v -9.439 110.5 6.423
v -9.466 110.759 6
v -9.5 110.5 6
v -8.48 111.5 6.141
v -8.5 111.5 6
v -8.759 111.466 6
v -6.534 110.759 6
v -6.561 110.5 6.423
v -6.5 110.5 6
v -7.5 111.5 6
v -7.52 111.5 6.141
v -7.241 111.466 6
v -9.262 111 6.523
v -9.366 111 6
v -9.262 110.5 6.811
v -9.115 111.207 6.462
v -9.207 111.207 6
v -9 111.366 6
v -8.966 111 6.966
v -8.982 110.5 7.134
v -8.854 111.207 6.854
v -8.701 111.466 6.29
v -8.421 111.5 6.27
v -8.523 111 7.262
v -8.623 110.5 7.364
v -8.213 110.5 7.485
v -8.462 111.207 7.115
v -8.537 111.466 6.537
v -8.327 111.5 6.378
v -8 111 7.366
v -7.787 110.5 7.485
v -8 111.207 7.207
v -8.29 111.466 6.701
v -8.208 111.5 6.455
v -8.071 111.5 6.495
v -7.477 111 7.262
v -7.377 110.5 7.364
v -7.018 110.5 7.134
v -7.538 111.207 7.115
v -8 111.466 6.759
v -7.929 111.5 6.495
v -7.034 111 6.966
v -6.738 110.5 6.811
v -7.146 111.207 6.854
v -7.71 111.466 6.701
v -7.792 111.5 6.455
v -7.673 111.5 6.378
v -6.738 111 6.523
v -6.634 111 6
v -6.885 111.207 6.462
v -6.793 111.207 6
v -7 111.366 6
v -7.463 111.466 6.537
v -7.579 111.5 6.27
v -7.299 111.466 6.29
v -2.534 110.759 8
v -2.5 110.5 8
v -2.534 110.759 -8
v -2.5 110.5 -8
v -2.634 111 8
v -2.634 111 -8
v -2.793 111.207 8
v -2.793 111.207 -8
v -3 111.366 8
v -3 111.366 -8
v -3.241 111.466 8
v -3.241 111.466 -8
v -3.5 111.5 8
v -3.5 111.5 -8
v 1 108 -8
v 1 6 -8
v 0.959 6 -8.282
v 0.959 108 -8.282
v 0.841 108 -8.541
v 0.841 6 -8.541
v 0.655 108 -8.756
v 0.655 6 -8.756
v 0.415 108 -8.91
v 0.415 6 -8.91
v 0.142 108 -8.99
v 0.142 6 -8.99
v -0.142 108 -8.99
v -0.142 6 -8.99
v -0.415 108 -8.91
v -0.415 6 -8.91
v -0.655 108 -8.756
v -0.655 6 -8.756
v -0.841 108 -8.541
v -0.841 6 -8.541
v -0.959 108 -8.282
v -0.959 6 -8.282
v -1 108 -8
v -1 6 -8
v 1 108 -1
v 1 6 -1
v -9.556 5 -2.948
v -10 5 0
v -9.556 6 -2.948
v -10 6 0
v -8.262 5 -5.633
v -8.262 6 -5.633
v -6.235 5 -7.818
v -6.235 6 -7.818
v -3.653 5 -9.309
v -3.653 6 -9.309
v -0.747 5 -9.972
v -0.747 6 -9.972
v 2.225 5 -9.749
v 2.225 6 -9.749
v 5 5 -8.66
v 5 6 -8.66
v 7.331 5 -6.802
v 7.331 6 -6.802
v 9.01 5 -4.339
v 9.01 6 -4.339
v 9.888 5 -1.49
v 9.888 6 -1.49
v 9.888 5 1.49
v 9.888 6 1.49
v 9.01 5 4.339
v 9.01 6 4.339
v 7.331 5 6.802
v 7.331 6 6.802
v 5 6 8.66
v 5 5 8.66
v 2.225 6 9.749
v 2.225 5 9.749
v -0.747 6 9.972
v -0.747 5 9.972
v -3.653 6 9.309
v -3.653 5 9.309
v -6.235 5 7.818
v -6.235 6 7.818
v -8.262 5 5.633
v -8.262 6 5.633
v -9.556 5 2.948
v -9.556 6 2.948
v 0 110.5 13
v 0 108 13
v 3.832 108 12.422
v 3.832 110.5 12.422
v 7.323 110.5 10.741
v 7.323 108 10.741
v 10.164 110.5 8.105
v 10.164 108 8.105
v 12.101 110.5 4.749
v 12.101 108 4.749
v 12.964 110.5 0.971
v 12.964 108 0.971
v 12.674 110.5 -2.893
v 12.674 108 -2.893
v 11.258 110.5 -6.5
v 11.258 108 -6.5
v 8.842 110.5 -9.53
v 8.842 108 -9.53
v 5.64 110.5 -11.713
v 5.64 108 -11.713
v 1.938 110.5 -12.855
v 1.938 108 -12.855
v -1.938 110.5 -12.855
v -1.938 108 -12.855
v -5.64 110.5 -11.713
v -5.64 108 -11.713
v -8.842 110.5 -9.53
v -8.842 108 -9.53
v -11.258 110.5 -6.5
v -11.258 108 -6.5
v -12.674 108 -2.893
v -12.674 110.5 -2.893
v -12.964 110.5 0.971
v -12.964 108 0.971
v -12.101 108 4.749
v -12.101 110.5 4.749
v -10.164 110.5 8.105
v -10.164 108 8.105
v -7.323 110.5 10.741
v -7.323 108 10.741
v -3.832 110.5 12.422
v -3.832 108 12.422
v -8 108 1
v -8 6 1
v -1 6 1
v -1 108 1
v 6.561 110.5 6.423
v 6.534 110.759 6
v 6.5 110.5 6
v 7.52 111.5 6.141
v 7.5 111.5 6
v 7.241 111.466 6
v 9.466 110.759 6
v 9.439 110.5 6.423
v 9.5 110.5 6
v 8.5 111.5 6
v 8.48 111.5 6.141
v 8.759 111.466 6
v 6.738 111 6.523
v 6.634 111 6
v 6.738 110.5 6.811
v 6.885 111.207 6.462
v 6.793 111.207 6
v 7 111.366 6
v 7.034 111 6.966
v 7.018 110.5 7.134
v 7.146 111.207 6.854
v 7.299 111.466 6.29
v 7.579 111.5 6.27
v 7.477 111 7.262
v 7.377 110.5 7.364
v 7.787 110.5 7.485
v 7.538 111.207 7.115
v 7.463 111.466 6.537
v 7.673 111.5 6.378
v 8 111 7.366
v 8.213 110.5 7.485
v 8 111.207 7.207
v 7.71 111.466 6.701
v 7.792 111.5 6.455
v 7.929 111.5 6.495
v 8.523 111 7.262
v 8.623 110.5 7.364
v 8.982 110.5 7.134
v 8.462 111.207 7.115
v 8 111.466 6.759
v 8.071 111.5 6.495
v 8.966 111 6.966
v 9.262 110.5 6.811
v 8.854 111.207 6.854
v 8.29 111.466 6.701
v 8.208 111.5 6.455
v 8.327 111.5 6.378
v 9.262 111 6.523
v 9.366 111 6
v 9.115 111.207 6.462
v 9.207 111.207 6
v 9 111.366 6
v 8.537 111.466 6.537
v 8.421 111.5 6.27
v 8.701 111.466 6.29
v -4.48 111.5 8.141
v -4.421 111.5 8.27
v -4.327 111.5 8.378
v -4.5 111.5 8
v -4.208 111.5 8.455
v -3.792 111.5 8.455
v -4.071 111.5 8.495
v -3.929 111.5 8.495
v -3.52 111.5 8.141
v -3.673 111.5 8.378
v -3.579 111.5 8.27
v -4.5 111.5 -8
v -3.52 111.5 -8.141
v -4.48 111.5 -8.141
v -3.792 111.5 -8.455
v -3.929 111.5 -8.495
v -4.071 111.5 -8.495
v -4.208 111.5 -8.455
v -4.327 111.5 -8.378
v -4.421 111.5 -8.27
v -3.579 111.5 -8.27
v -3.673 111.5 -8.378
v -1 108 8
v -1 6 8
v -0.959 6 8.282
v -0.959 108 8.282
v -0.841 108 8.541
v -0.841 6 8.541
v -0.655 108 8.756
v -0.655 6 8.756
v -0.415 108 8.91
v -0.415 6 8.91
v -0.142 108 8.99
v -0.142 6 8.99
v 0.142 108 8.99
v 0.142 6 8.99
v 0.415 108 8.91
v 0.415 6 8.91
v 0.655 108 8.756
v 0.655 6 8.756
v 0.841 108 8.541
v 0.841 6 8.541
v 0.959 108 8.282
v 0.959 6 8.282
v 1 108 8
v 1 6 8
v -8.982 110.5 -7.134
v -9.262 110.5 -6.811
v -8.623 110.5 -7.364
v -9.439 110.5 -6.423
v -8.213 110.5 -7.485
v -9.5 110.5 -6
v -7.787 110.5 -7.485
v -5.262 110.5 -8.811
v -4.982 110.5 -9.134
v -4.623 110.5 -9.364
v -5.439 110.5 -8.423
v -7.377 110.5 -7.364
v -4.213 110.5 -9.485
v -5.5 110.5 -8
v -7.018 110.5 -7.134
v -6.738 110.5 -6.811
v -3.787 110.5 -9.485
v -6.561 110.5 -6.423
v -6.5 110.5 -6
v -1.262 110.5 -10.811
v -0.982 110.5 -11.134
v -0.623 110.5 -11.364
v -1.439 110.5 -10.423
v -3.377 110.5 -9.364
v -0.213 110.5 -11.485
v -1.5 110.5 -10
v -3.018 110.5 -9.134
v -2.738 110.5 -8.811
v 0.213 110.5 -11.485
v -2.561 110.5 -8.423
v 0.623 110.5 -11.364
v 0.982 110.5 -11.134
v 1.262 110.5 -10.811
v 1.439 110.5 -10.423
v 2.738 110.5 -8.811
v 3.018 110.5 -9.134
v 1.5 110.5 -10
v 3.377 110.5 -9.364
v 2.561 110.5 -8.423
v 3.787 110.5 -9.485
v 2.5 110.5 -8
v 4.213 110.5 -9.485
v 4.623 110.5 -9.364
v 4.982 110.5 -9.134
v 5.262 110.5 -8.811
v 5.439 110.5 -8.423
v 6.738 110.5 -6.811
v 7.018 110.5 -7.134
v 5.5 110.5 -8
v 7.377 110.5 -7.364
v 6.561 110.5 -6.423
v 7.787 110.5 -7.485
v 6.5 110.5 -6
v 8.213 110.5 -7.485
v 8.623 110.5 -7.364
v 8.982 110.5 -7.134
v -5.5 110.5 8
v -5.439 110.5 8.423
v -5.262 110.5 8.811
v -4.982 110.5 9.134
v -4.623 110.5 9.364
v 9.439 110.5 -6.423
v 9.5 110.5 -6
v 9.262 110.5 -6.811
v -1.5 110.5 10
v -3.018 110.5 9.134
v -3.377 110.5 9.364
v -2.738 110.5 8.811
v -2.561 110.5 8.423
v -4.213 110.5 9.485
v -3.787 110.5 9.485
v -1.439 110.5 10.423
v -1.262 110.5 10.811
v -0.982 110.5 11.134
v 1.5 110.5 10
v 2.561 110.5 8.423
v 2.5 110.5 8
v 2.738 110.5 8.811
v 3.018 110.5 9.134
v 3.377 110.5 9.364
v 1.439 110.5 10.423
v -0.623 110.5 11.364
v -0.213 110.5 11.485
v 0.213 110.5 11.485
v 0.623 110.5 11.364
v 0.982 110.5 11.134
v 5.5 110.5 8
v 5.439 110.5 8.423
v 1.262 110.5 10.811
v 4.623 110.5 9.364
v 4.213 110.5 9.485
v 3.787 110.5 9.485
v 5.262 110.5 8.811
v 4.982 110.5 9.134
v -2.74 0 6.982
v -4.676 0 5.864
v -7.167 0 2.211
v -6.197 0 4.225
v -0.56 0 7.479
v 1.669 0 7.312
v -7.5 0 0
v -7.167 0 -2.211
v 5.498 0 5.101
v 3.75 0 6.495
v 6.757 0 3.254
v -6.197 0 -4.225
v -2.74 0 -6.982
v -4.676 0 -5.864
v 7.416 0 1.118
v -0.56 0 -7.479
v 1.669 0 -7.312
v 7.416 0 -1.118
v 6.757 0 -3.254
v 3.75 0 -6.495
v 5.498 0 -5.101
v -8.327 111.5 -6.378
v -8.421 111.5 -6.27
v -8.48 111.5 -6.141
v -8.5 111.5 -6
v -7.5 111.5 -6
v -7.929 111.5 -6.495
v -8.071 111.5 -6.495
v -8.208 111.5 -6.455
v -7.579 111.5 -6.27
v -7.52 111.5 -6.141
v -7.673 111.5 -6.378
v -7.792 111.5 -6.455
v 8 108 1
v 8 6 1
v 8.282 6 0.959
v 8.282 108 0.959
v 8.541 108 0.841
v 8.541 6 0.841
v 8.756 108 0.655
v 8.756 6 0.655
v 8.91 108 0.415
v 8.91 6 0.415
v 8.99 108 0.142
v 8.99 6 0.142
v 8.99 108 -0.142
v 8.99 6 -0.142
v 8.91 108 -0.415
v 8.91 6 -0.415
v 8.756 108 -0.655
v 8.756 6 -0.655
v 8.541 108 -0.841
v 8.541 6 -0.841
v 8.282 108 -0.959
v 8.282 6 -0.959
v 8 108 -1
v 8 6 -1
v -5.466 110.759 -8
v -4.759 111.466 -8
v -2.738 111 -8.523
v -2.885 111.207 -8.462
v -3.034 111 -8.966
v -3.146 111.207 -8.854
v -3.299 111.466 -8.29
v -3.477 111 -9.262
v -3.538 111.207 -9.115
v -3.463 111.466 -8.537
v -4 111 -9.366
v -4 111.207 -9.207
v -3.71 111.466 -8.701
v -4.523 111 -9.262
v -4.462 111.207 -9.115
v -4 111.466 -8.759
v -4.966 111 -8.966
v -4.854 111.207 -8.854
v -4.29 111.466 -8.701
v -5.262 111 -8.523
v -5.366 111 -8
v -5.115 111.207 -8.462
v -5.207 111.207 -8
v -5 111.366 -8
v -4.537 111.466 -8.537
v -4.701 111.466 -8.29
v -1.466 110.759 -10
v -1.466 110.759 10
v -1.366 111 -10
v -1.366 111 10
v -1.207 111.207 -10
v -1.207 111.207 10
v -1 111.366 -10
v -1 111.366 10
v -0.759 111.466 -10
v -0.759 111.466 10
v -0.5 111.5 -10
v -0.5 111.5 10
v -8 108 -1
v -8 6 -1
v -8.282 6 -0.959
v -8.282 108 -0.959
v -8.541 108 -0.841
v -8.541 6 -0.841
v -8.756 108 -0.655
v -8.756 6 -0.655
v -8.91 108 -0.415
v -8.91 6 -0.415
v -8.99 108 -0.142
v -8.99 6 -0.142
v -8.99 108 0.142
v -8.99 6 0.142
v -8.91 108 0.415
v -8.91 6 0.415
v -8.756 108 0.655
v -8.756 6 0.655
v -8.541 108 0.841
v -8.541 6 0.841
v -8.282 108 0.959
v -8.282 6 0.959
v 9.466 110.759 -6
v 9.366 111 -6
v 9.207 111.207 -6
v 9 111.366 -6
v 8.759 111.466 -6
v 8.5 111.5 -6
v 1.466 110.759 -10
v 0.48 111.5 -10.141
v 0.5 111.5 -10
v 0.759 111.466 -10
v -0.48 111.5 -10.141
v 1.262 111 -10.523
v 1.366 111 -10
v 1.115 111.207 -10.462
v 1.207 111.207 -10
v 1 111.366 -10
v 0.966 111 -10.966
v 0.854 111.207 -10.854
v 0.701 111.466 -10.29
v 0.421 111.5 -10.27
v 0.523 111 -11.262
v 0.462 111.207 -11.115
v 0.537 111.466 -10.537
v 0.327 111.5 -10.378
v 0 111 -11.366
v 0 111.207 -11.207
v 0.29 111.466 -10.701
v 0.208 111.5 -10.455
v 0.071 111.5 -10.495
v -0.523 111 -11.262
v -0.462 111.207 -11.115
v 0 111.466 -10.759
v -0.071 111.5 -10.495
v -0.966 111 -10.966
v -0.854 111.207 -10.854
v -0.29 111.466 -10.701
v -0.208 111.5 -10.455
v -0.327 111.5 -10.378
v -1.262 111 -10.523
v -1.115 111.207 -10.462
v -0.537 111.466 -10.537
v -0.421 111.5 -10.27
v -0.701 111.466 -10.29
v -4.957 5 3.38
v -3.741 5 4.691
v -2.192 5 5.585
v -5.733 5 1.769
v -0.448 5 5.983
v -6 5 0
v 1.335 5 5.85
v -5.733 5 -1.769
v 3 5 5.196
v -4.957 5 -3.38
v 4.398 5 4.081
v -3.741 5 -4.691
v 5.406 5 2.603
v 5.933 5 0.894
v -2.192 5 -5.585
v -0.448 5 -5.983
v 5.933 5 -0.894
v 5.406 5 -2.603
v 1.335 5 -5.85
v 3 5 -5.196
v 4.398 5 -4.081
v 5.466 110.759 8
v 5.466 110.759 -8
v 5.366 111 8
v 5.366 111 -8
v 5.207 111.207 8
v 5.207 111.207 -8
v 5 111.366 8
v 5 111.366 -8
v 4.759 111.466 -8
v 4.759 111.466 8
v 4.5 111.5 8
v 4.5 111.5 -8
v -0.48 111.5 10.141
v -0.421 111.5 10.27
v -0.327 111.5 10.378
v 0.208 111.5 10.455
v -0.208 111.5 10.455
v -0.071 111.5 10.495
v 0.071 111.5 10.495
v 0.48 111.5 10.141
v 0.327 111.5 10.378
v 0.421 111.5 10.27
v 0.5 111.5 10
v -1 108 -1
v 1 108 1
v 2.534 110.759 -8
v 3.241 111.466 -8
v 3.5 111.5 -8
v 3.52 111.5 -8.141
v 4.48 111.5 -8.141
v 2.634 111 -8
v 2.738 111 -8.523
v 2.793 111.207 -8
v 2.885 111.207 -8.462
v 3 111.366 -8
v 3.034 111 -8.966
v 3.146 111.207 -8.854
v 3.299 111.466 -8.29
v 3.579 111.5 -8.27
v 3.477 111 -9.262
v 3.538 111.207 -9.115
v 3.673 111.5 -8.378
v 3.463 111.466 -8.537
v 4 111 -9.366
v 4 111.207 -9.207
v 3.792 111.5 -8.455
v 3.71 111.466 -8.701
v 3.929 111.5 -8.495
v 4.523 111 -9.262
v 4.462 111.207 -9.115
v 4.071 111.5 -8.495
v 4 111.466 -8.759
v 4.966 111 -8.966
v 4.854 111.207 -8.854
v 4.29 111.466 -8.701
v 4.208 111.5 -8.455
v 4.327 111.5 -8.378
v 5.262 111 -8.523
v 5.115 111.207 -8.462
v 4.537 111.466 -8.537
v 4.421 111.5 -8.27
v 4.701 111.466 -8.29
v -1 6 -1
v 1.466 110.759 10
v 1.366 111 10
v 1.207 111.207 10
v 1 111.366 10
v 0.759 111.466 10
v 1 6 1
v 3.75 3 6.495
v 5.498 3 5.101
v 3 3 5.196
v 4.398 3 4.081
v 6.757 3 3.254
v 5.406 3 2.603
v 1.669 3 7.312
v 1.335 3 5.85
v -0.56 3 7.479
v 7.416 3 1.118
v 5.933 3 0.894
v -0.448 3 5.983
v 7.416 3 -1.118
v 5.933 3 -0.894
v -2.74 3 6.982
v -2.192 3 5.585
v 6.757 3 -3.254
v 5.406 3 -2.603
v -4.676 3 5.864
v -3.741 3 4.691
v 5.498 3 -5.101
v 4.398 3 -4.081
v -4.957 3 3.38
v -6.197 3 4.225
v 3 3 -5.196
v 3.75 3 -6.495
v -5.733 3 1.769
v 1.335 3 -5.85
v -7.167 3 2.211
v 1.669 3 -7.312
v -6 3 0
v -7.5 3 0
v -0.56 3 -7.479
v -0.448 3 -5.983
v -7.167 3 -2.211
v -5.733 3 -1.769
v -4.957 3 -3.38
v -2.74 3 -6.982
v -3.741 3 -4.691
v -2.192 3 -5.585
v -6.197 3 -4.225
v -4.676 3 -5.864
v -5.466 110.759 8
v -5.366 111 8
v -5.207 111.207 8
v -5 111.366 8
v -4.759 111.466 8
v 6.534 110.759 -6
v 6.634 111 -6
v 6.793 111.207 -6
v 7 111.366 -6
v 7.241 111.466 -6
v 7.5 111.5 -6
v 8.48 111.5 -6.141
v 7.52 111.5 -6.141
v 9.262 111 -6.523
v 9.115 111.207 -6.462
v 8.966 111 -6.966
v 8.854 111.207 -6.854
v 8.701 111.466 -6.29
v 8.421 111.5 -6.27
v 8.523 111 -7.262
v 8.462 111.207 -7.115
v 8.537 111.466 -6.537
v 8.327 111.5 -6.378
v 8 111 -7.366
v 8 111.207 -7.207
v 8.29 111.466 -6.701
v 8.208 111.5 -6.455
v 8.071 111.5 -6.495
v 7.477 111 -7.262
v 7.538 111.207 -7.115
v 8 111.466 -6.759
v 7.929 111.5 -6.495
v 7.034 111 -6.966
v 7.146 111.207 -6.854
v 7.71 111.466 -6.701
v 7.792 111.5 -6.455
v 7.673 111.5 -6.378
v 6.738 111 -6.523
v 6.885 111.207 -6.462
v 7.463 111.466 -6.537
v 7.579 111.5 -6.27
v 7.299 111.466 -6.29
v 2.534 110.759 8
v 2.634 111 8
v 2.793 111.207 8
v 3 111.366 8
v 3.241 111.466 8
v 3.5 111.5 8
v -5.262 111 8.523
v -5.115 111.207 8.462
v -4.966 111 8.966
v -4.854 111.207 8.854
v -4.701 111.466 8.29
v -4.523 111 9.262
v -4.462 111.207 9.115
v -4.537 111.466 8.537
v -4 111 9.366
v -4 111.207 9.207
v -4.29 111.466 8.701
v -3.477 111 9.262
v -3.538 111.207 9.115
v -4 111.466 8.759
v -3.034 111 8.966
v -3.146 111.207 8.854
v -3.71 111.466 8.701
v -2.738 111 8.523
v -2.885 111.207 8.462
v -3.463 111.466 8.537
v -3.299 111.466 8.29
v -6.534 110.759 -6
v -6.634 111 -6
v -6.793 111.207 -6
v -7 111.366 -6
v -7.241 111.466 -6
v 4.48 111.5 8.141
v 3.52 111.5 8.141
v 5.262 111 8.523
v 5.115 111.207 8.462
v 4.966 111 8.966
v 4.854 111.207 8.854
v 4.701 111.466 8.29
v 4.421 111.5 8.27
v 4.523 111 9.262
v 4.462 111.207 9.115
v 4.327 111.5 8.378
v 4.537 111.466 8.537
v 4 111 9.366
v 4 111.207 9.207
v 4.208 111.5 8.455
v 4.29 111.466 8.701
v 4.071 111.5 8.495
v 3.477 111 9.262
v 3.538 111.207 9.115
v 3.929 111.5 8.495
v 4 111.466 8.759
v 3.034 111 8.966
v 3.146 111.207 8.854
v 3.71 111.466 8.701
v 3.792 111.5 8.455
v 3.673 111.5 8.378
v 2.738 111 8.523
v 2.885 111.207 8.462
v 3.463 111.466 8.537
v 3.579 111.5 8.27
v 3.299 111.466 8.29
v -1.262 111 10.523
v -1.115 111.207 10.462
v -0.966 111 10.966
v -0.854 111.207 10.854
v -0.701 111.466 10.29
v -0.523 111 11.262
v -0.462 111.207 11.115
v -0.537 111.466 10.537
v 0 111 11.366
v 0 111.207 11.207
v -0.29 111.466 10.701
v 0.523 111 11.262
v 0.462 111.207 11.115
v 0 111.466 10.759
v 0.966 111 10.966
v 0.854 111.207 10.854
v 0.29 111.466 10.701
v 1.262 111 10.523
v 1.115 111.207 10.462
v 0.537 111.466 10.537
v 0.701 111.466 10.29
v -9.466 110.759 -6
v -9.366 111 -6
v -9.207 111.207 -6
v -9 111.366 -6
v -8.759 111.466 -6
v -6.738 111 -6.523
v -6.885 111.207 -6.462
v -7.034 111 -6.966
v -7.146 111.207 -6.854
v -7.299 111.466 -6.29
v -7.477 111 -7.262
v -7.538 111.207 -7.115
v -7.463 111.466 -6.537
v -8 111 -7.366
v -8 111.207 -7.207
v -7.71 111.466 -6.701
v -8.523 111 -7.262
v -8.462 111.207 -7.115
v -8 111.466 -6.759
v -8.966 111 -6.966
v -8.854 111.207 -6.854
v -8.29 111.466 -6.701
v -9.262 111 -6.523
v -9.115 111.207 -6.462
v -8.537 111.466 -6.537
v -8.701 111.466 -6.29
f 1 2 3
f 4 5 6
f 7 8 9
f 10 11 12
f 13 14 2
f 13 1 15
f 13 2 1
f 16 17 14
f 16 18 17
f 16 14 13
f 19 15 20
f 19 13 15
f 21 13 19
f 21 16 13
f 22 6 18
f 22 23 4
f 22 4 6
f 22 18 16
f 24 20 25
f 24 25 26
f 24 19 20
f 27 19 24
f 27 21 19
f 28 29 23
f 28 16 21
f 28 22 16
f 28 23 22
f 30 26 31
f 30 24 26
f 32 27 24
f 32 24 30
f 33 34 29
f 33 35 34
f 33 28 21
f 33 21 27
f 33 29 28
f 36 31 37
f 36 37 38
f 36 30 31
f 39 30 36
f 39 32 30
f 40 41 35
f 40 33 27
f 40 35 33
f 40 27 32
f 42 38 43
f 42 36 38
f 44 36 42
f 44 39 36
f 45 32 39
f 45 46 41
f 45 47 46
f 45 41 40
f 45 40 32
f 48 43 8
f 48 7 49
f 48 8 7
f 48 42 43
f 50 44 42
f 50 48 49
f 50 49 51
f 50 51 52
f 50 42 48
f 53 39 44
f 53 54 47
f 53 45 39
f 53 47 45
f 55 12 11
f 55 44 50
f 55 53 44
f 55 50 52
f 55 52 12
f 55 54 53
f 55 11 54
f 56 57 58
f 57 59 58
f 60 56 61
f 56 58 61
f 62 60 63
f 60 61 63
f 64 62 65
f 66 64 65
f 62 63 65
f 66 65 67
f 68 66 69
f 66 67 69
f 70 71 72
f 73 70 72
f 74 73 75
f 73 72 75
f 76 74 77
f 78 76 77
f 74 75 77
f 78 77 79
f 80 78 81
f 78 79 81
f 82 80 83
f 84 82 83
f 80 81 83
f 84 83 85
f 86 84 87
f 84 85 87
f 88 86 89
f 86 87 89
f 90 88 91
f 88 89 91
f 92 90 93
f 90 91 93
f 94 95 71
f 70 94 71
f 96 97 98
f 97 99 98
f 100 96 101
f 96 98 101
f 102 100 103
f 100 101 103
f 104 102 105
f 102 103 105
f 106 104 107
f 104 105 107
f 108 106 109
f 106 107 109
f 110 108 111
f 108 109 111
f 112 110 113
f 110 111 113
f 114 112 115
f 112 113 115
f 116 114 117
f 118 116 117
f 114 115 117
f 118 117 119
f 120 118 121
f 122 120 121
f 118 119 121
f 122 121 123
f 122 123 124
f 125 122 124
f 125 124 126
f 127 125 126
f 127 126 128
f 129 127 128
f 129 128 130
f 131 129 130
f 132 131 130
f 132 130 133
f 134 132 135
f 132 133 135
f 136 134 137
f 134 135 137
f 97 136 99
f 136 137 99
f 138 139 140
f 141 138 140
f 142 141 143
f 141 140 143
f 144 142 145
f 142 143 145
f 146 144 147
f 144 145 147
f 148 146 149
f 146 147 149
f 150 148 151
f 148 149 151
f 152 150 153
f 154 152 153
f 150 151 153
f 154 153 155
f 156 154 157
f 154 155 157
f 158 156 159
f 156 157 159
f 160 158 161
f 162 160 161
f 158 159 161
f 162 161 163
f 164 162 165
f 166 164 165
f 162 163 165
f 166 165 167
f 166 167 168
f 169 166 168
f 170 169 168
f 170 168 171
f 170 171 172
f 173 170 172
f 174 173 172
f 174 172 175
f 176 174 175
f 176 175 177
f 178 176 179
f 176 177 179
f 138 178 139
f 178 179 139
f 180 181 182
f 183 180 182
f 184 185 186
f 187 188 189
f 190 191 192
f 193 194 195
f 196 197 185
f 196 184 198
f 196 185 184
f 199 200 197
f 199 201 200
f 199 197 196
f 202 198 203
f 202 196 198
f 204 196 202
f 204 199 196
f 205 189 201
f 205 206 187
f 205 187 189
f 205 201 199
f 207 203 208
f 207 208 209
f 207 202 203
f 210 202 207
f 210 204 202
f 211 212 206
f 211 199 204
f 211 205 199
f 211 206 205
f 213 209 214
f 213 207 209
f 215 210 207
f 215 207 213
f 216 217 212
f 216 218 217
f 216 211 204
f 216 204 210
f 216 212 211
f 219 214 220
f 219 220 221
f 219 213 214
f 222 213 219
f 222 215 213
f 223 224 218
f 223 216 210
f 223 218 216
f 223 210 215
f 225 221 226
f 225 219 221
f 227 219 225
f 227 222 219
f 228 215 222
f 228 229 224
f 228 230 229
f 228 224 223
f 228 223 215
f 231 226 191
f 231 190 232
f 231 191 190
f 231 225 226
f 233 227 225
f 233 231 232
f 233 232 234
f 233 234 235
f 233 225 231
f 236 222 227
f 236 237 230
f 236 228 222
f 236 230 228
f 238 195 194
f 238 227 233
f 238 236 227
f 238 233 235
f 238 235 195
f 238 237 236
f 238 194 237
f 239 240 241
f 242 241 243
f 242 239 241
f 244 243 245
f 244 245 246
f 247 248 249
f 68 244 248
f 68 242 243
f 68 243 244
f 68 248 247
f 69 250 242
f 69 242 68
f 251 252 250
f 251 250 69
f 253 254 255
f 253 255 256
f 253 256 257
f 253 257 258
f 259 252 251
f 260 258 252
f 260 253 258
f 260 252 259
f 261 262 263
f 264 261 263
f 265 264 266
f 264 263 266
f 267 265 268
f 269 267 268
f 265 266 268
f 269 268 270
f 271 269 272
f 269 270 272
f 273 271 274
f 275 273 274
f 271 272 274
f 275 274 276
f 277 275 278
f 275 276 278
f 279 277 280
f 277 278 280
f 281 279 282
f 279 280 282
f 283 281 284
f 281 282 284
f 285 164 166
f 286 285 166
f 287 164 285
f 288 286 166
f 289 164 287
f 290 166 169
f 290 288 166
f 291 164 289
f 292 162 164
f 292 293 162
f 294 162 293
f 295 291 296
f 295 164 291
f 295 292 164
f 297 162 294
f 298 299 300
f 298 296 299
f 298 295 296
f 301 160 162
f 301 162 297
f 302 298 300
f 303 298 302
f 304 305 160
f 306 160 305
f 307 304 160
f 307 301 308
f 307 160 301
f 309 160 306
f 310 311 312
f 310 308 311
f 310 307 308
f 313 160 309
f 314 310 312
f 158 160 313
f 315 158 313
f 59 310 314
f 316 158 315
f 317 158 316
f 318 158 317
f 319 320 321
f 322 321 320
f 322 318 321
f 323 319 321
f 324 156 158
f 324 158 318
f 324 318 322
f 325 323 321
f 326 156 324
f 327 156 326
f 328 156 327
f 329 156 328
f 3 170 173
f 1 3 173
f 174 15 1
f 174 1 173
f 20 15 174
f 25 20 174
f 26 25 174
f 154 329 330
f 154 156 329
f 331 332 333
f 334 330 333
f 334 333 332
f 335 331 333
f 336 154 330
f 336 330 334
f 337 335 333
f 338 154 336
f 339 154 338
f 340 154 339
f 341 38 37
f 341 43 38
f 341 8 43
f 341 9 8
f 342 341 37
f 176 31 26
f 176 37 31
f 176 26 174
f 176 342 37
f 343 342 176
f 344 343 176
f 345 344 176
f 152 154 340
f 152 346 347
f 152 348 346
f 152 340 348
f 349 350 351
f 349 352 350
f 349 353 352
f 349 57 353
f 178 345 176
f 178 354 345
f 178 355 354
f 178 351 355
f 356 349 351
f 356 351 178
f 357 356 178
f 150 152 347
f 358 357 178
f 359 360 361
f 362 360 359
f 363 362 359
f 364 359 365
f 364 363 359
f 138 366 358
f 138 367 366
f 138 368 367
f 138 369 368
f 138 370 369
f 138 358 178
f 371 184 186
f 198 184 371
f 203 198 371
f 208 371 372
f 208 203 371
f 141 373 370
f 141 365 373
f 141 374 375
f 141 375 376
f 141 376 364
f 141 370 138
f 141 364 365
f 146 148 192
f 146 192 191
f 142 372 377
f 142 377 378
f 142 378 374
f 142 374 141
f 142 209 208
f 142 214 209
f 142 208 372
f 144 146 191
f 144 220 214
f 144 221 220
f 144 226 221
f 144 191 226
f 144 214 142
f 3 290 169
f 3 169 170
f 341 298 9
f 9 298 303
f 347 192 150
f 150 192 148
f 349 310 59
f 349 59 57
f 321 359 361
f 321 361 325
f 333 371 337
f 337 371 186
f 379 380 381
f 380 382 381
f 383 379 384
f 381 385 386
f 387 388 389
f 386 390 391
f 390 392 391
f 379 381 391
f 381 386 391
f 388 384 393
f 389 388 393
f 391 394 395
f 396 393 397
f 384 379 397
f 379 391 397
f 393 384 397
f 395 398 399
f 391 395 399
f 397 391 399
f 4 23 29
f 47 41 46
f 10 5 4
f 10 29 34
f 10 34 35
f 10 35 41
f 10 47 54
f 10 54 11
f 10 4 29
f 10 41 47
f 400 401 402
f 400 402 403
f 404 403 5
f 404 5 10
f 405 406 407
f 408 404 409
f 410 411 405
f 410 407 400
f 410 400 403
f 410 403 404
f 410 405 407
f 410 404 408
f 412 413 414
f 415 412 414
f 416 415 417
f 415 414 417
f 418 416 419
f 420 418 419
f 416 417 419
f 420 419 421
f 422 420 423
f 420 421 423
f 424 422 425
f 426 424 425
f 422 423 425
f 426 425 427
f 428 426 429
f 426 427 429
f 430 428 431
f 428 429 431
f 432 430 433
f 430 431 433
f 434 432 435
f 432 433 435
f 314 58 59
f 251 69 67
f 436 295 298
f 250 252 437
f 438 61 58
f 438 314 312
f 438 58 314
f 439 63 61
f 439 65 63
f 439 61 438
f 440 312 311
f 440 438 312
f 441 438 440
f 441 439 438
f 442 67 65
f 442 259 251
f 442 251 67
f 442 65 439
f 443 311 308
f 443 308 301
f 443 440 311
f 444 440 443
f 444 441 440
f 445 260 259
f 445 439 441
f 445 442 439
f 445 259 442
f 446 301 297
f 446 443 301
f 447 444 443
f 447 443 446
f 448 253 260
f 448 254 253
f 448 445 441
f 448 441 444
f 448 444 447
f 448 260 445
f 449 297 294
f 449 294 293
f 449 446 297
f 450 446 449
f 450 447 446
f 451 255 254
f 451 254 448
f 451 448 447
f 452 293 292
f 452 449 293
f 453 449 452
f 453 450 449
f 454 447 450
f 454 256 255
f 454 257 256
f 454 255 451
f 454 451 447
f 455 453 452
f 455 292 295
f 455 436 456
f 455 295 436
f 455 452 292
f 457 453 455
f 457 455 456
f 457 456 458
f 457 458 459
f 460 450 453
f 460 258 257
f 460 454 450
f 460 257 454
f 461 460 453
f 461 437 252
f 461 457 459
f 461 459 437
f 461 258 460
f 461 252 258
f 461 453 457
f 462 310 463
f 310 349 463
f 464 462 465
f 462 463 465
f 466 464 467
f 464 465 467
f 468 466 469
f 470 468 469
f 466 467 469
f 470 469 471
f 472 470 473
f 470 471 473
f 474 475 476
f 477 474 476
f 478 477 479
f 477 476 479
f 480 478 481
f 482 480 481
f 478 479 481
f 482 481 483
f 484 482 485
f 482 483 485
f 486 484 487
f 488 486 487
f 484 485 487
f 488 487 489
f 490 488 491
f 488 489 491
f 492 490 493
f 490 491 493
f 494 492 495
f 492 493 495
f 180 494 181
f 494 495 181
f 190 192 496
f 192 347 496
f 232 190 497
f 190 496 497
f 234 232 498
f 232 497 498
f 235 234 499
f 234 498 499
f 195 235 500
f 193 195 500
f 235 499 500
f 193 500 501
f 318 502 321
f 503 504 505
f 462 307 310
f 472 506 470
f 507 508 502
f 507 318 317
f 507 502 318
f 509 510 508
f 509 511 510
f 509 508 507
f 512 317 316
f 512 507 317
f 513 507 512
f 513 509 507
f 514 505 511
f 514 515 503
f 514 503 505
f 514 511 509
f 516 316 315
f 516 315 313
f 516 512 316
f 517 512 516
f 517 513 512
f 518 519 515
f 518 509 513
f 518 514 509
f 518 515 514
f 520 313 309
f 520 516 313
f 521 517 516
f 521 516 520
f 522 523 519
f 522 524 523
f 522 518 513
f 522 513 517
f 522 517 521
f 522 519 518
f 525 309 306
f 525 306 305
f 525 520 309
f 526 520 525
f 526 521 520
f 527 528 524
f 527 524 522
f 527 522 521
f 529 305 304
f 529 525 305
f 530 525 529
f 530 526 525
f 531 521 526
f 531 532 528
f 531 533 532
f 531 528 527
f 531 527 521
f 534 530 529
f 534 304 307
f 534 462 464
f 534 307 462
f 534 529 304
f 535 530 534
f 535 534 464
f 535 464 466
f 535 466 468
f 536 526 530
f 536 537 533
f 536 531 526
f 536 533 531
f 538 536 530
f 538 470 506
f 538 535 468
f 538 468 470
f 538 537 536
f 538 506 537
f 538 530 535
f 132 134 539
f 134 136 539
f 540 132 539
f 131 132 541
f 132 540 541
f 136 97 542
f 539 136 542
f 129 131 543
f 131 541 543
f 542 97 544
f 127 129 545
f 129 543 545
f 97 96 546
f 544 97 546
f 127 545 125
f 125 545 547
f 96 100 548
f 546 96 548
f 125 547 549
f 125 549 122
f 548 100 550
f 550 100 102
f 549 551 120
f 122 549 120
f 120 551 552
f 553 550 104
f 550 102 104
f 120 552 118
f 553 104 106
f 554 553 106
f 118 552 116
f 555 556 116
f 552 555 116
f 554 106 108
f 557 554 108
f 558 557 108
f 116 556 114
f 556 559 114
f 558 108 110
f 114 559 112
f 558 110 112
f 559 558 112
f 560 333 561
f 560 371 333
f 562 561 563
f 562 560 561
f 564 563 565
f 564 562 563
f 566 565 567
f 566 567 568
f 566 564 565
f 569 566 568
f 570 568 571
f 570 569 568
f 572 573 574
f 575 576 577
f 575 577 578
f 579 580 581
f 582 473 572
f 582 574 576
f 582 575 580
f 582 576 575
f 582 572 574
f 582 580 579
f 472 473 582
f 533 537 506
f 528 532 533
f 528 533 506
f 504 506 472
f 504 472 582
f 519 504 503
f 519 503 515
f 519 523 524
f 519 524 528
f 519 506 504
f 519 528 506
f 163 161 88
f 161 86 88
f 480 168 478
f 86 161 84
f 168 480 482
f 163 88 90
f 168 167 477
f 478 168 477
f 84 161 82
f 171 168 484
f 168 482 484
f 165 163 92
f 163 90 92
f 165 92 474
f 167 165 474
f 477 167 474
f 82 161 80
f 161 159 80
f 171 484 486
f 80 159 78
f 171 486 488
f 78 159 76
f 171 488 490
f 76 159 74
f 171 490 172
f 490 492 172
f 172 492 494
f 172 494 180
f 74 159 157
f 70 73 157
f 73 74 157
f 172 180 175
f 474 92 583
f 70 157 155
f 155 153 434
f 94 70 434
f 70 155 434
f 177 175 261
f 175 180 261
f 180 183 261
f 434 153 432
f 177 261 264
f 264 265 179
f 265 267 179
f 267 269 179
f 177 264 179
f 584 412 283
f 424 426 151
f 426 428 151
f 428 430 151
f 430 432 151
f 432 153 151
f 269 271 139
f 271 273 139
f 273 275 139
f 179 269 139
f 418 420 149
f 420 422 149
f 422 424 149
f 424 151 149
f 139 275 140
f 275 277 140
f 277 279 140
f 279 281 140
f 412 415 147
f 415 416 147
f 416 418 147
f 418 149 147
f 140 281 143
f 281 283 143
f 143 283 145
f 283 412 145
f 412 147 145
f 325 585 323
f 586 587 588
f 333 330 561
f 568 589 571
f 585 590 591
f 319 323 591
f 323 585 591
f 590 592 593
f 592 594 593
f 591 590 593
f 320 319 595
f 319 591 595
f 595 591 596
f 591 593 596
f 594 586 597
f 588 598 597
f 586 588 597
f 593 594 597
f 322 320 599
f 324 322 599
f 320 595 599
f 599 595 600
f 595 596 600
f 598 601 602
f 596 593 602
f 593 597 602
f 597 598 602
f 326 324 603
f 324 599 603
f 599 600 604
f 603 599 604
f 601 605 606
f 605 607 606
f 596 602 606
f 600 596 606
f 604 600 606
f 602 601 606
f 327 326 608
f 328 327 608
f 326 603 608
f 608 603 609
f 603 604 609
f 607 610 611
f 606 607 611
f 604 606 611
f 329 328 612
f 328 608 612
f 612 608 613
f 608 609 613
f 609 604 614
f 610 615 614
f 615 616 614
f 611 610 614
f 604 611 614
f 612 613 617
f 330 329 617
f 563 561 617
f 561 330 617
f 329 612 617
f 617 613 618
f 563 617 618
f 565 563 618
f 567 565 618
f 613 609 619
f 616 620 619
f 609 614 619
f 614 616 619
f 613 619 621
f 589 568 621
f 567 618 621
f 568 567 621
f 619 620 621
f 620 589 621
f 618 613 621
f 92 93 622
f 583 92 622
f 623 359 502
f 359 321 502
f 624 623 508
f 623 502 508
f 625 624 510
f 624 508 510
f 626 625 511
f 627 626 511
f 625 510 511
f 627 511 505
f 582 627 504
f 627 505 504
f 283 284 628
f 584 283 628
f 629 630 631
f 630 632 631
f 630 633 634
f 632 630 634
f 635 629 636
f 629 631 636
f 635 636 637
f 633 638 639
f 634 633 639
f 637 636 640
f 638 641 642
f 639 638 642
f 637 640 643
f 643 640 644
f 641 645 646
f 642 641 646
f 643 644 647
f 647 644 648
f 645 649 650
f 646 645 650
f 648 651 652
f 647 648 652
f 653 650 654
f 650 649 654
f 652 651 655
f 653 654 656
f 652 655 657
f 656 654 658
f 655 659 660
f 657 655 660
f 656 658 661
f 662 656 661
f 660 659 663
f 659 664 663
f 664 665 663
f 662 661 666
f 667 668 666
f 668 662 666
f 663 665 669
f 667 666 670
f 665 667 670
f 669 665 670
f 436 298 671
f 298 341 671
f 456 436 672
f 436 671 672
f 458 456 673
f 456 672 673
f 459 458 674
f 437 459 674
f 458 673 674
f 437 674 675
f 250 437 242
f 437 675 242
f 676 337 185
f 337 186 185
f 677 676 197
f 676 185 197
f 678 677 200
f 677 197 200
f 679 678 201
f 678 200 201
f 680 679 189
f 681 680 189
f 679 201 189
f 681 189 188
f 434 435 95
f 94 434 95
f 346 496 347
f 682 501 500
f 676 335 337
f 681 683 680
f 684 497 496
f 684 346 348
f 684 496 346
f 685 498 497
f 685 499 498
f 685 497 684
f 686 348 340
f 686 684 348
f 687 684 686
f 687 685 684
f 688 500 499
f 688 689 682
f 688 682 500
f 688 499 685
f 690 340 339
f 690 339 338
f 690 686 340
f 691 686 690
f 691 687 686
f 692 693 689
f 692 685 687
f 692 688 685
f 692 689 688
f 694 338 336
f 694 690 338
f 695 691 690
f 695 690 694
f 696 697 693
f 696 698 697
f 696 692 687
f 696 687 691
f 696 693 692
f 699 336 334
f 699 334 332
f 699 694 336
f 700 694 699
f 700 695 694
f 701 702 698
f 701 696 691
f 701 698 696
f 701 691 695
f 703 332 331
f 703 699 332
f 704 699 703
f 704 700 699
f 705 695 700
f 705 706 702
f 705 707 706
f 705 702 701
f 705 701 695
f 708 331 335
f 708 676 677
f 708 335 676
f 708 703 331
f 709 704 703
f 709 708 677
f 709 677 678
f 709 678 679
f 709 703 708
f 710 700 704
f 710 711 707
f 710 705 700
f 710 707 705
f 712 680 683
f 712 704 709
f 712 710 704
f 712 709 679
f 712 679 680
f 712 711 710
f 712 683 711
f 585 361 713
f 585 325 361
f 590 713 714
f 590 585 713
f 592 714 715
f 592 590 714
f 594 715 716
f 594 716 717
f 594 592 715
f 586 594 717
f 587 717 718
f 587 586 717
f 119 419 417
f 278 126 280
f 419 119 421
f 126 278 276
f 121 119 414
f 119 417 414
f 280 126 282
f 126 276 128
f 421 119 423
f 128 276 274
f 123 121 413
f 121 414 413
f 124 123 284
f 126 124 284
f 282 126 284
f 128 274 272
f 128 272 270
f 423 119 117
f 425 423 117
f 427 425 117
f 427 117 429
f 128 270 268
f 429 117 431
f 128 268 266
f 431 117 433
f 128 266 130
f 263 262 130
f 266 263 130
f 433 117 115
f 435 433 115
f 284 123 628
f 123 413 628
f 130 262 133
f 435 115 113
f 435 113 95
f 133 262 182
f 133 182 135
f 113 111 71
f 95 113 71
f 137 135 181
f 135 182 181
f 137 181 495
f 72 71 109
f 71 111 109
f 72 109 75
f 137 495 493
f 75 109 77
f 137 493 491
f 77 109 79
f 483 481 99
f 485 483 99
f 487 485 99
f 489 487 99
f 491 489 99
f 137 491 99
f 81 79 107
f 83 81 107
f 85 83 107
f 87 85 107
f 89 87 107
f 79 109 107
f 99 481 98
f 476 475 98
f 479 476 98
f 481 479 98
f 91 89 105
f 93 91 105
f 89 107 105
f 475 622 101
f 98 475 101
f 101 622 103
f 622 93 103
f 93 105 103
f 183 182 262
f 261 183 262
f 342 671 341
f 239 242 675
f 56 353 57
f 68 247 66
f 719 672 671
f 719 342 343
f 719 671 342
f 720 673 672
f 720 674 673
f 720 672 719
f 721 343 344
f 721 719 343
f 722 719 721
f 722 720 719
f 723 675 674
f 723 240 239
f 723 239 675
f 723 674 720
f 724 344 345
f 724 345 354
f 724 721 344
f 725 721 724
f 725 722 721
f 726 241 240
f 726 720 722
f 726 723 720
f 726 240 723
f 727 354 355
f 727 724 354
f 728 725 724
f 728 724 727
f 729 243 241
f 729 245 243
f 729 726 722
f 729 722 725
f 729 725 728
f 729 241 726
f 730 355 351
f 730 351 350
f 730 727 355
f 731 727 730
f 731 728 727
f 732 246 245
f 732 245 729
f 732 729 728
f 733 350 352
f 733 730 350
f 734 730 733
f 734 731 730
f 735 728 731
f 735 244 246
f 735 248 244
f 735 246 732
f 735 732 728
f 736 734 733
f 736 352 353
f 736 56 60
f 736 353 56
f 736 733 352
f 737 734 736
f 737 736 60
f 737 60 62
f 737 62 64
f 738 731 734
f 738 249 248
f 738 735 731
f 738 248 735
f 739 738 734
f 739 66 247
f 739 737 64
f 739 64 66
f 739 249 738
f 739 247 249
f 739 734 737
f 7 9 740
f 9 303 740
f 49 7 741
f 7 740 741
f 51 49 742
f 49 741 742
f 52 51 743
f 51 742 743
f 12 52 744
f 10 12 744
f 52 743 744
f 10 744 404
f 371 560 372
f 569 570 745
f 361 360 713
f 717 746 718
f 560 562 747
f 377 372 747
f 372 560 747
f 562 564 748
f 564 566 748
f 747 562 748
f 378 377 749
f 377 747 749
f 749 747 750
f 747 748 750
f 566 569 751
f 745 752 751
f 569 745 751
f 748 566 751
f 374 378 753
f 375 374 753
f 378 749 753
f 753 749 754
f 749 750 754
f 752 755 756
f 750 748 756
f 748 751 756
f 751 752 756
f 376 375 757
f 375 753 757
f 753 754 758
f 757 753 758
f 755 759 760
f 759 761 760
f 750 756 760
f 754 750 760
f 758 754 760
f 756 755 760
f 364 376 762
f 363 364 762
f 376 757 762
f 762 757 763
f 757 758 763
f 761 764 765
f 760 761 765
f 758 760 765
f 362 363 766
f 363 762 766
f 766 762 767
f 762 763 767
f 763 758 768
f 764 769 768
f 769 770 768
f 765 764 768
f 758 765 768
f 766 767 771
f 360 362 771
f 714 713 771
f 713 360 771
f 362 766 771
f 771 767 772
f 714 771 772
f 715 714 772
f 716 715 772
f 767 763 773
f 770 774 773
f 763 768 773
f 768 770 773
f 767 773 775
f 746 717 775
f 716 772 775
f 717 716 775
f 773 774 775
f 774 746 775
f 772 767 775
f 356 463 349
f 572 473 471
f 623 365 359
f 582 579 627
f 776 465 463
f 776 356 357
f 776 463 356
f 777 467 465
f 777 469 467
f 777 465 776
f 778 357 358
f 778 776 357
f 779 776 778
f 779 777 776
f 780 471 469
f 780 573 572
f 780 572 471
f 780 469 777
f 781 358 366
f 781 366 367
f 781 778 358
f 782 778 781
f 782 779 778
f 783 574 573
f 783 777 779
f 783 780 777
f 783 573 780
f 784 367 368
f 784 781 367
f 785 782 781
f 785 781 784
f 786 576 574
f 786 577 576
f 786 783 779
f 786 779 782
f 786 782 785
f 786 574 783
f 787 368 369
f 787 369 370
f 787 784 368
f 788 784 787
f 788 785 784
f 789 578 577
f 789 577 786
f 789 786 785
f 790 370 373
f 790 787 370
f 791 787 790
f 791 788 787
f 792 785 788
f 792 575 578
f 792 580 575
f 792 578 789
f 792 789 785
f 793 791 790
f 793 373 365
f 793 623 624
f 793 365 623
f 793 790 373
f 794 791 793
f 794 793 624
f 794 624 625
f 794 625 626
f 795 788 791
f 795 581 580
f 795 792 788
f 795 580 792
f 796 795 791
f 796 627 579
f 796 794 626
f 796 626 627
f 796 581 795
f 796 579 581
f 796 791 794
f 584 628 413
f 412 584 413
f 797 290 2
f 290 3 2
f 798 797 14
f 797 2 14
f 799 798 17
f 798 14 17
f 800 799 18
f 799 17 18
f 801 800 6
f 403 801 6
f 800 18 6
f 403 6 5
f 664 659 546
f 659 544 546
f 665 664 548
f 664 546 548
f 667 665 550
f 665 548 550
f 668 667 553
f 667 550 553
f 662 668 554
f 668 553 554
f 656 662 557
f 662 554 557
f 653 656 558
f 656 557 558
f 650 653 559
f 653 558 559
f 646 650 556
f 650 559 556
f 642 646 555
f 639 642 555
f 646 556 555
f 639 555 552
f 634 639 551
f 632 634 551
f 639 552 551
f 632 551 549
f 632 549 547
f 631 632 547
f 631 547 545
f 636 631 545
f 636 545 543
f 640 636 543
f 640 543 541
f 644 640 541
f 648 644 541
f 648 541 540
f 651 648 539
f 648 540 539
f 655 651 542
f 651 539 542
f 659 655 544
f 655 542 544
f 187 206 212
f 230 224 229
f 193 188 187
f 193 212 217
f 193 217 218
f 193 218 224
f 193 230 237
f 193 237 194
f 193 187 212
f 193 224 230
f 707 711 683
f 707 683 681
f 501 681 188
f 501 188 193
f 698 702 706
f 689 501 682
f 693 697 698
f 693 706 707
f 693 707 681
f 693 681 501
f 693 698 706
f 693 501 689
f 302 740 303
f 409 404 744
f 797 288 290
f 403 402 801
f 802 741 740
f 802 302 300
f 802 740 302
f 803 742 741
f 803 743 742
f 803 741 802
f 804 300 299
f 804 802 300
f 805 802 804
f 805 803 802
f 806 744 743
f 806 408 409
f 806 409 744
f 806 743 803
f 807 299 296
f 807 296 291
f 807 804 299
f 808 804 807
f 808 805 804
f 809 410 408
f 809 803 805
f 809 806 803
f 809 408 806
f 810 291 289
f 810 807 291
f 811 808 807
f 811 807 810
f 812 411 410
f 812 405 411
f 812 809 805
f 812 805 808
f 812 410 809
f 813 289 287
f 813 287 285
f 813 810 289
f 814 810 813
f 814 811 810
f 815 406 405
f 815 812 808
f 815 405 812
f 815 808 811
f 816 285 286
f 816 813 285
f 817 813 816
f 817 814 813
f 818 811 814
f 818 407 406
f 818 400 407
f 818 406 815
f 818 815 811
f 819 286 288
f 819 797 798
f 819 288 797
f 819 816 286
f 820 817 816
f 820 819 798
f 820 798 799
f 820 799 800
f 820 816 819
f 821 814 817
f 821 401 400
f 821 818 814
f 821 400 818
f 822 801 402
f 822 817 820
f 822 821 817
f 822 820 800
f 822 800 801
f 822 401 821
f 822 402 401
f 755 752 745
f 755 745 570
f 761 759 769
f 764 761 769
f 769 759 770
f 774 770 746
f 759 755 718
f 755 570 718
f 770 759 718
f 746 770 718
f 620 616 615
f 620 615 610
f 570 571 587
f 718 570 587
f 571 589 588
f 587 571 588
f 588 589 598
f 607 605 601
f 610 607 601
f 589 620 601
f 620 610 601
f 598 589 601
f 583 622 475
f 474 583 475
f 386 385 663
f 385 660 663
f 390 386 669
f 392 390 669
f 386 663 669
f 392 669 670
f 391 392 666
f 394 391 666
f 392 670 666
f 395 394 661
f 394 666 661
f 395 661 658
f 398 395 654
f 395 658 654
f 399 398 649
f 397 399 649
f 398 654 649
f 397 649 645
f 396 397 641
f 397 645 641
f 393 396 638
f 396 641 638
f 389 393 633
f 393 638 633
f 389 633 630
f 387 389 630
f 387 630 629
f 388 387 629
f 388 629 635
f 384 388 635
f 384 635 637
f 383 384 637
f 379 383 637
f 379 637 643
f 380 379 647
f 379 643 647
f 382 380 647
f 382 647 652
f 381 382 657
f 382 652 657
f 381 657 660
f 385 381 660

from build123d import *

# Parameters (mm, degrees)
SKETCH4_W           = 2
SKETCH4_H           = 2
BOSS_EXTRUDE5_DEPTH = 102
SKETCH5_R           = 13
BOSS_EXTRUDE6_DEPTH = 2.5
BOSS_EXTRUDE7_DEPTH = 1
FILLET1_R           = 1


with BuildPart() as part:
    # Sketch3 → Revolve1 (revolve)
    with BuildSketch(Plane.XY, mode=Mode.PRIVATE) as revolve1_sk:
        Polygon((0, 0), (7.5, 0), (7.5, 3), (6, 3), (6, 5), (10, 5), (10, 6), (0, 6), align=None)
    revolve(revolve1_sk.sketch.rotate(Axis((0, 6, 0), (0, -1, 0)), 180), axis=Axis((0, 6, 0), (0, -1, 0)))

    # Sketch4 → Boss-Extrude5 (add)
    with BuildSketch(Plane(origin=(0, 6, 0), x_dir=(1, 0, 0), z_dir=(0, 1, 0))):
        with BuildLine():
            ThreePointArc((1, 8), (0, 9), (-1, 8))
            Line((-1, 8), (-1, 1))
            Line((-1, 1), (1, 1))
            Line((1, 1), (1, 8))
        make_face()
        with BuildLine():
            Line((-1, -1), (-1, 1))
            Line((-1, 1), (-8, 1))
            ThreePointArc((-8, 1), (-9, 0), (-8, -1))
            Line((-8, -1), (-1, -1))
        make_face()
        with BuildLine():
            Line((1, -1), (-1, -1))
            Line((-1, -1), (-1, -8))
            ThreePointArc((-1, -8), (0, -9), (1, -8))
            Line((1, -8), (1, -1))
        make_face()
        with BuildLine():
            Line((8, 1), (1, 1))
            Line((1, 1), (1, -1))
            Line((1, -1), (8, -1))
            ThreePointArc((8, -1), (9, 0), (8, 1))
        make_face()
        Rectangle(SKETCH4_W, SKETCH4_H)
    extrude(amount=BOSS_EXTRUDE5_DEPTH)

    # Sketch5 → Boss-Extrude6 (add)
    with BuildSketch(Plane(origin=(0, 108, 0), x_dir=(1, 0, 0), z_dir=(0, 1, 0))):
        with Locations(Location((0, 0, 0), (0, 0, 270))):
            Circle(SKETCH5_R)
    extrude(amount=BOSS_EXTRUDE6_DEPTH)

    # Sketch8 → Boss-Extrude7 (add)
    with BuildSketch(Plane(origin=(0, 110.5, 0), x_dir=(1, 0, 0), z_dir=(0, 1, 0))):
        with BuildLine():
            Line((-1.5, 10), (-1.5, -10))
            ThreePointArc((-1.5, -10), (0, -11.5), (1.5, -10))
            Line((1.5, -10), (1.5, 10))
            ThreePointArc((1.5, 10), (0, 11.5), (-1.5, 10))
        make_face()
        with BuildLine():
            Line((-5.5, 8), (-5.5, -8))
            ThreePointArc((-5.5, -8), (-4, -9.5), (-2.5, -8))
            Line((-2.5, -8), (-2.5, 8))
            ThreePointArc((-2.5, 8), (-4, 9.5), (-5.5, 8))
        make_face()
        with BuildLine():
            Line((-9.5, 6), (-9.5, -6))
            ThreePointArc((-9.5, -6), (-8, -7.5), (-6.5, -6))
            Line((-6.5, -6), (-6.5, 6))
            ThreePointArc((-6.5, 6), (-8, 7.5), (-9.5, 6))
        make_face()
        with BuildLine():
            Line((6.5, 6), (6.5, -6))
            ThreePointArc((6.5, -6), (8, -7.5), (9.5, -6))
            Line((9.5, -6), (9.5, 6))
            ThreePointArc((9.5, 6), (8, 7.5), (6.5, 6))
        make_face()
        with BuildLine():
            Line((5.5, 8), (5.5, -8))
            ThreePointArc((5.5, -8), (4, -9.5), (2.5, -8))
            Line((2.5, -8), (2.5, 8))
            ThreePointArc((2.5, 8), (4, 9.5), (5.5, 8))
        make_face()
    extrude(amount=BOSS_EXTRUDE7_DEPTH)

    # Fillet1
    fillet1_edges = [part.edges().sort_by_distance(p)[0] for p in [
        (9.5, 111.5, 0),
        (8, 111.5, 7.5),
        (6.5, 111.5, 0),
        (8, 111.5, -7.5),
        (5.5, 111.5, 0),
        (4, 111.5, 9.5),
        (2.5, 111.5, 0),
        (4, 111.5, -9.5),
        (1.5, 111.5, 0),
        (0, 111.5, 11.5),
        (-1.5, 111.5, 0),
        (0, 111.5, -11.5),
        (-2.5, 111.5, 0),
        (-4, 111.5, 9.5),
        (-5.5, 111.5, 0),
        (-4, 111.5, -9.5),
        (-6.5, 111.5, 0),
        (-8, 111.5, 7.5),
        (-9.5, 111.5, 0),
        (-8, 111.5, -7.5),
    ]]
    fillet(fillet1_edges, radius=FILLET1_R - 0.0001)  # a hair under: the kernel refuses the full size


solid = part.part
